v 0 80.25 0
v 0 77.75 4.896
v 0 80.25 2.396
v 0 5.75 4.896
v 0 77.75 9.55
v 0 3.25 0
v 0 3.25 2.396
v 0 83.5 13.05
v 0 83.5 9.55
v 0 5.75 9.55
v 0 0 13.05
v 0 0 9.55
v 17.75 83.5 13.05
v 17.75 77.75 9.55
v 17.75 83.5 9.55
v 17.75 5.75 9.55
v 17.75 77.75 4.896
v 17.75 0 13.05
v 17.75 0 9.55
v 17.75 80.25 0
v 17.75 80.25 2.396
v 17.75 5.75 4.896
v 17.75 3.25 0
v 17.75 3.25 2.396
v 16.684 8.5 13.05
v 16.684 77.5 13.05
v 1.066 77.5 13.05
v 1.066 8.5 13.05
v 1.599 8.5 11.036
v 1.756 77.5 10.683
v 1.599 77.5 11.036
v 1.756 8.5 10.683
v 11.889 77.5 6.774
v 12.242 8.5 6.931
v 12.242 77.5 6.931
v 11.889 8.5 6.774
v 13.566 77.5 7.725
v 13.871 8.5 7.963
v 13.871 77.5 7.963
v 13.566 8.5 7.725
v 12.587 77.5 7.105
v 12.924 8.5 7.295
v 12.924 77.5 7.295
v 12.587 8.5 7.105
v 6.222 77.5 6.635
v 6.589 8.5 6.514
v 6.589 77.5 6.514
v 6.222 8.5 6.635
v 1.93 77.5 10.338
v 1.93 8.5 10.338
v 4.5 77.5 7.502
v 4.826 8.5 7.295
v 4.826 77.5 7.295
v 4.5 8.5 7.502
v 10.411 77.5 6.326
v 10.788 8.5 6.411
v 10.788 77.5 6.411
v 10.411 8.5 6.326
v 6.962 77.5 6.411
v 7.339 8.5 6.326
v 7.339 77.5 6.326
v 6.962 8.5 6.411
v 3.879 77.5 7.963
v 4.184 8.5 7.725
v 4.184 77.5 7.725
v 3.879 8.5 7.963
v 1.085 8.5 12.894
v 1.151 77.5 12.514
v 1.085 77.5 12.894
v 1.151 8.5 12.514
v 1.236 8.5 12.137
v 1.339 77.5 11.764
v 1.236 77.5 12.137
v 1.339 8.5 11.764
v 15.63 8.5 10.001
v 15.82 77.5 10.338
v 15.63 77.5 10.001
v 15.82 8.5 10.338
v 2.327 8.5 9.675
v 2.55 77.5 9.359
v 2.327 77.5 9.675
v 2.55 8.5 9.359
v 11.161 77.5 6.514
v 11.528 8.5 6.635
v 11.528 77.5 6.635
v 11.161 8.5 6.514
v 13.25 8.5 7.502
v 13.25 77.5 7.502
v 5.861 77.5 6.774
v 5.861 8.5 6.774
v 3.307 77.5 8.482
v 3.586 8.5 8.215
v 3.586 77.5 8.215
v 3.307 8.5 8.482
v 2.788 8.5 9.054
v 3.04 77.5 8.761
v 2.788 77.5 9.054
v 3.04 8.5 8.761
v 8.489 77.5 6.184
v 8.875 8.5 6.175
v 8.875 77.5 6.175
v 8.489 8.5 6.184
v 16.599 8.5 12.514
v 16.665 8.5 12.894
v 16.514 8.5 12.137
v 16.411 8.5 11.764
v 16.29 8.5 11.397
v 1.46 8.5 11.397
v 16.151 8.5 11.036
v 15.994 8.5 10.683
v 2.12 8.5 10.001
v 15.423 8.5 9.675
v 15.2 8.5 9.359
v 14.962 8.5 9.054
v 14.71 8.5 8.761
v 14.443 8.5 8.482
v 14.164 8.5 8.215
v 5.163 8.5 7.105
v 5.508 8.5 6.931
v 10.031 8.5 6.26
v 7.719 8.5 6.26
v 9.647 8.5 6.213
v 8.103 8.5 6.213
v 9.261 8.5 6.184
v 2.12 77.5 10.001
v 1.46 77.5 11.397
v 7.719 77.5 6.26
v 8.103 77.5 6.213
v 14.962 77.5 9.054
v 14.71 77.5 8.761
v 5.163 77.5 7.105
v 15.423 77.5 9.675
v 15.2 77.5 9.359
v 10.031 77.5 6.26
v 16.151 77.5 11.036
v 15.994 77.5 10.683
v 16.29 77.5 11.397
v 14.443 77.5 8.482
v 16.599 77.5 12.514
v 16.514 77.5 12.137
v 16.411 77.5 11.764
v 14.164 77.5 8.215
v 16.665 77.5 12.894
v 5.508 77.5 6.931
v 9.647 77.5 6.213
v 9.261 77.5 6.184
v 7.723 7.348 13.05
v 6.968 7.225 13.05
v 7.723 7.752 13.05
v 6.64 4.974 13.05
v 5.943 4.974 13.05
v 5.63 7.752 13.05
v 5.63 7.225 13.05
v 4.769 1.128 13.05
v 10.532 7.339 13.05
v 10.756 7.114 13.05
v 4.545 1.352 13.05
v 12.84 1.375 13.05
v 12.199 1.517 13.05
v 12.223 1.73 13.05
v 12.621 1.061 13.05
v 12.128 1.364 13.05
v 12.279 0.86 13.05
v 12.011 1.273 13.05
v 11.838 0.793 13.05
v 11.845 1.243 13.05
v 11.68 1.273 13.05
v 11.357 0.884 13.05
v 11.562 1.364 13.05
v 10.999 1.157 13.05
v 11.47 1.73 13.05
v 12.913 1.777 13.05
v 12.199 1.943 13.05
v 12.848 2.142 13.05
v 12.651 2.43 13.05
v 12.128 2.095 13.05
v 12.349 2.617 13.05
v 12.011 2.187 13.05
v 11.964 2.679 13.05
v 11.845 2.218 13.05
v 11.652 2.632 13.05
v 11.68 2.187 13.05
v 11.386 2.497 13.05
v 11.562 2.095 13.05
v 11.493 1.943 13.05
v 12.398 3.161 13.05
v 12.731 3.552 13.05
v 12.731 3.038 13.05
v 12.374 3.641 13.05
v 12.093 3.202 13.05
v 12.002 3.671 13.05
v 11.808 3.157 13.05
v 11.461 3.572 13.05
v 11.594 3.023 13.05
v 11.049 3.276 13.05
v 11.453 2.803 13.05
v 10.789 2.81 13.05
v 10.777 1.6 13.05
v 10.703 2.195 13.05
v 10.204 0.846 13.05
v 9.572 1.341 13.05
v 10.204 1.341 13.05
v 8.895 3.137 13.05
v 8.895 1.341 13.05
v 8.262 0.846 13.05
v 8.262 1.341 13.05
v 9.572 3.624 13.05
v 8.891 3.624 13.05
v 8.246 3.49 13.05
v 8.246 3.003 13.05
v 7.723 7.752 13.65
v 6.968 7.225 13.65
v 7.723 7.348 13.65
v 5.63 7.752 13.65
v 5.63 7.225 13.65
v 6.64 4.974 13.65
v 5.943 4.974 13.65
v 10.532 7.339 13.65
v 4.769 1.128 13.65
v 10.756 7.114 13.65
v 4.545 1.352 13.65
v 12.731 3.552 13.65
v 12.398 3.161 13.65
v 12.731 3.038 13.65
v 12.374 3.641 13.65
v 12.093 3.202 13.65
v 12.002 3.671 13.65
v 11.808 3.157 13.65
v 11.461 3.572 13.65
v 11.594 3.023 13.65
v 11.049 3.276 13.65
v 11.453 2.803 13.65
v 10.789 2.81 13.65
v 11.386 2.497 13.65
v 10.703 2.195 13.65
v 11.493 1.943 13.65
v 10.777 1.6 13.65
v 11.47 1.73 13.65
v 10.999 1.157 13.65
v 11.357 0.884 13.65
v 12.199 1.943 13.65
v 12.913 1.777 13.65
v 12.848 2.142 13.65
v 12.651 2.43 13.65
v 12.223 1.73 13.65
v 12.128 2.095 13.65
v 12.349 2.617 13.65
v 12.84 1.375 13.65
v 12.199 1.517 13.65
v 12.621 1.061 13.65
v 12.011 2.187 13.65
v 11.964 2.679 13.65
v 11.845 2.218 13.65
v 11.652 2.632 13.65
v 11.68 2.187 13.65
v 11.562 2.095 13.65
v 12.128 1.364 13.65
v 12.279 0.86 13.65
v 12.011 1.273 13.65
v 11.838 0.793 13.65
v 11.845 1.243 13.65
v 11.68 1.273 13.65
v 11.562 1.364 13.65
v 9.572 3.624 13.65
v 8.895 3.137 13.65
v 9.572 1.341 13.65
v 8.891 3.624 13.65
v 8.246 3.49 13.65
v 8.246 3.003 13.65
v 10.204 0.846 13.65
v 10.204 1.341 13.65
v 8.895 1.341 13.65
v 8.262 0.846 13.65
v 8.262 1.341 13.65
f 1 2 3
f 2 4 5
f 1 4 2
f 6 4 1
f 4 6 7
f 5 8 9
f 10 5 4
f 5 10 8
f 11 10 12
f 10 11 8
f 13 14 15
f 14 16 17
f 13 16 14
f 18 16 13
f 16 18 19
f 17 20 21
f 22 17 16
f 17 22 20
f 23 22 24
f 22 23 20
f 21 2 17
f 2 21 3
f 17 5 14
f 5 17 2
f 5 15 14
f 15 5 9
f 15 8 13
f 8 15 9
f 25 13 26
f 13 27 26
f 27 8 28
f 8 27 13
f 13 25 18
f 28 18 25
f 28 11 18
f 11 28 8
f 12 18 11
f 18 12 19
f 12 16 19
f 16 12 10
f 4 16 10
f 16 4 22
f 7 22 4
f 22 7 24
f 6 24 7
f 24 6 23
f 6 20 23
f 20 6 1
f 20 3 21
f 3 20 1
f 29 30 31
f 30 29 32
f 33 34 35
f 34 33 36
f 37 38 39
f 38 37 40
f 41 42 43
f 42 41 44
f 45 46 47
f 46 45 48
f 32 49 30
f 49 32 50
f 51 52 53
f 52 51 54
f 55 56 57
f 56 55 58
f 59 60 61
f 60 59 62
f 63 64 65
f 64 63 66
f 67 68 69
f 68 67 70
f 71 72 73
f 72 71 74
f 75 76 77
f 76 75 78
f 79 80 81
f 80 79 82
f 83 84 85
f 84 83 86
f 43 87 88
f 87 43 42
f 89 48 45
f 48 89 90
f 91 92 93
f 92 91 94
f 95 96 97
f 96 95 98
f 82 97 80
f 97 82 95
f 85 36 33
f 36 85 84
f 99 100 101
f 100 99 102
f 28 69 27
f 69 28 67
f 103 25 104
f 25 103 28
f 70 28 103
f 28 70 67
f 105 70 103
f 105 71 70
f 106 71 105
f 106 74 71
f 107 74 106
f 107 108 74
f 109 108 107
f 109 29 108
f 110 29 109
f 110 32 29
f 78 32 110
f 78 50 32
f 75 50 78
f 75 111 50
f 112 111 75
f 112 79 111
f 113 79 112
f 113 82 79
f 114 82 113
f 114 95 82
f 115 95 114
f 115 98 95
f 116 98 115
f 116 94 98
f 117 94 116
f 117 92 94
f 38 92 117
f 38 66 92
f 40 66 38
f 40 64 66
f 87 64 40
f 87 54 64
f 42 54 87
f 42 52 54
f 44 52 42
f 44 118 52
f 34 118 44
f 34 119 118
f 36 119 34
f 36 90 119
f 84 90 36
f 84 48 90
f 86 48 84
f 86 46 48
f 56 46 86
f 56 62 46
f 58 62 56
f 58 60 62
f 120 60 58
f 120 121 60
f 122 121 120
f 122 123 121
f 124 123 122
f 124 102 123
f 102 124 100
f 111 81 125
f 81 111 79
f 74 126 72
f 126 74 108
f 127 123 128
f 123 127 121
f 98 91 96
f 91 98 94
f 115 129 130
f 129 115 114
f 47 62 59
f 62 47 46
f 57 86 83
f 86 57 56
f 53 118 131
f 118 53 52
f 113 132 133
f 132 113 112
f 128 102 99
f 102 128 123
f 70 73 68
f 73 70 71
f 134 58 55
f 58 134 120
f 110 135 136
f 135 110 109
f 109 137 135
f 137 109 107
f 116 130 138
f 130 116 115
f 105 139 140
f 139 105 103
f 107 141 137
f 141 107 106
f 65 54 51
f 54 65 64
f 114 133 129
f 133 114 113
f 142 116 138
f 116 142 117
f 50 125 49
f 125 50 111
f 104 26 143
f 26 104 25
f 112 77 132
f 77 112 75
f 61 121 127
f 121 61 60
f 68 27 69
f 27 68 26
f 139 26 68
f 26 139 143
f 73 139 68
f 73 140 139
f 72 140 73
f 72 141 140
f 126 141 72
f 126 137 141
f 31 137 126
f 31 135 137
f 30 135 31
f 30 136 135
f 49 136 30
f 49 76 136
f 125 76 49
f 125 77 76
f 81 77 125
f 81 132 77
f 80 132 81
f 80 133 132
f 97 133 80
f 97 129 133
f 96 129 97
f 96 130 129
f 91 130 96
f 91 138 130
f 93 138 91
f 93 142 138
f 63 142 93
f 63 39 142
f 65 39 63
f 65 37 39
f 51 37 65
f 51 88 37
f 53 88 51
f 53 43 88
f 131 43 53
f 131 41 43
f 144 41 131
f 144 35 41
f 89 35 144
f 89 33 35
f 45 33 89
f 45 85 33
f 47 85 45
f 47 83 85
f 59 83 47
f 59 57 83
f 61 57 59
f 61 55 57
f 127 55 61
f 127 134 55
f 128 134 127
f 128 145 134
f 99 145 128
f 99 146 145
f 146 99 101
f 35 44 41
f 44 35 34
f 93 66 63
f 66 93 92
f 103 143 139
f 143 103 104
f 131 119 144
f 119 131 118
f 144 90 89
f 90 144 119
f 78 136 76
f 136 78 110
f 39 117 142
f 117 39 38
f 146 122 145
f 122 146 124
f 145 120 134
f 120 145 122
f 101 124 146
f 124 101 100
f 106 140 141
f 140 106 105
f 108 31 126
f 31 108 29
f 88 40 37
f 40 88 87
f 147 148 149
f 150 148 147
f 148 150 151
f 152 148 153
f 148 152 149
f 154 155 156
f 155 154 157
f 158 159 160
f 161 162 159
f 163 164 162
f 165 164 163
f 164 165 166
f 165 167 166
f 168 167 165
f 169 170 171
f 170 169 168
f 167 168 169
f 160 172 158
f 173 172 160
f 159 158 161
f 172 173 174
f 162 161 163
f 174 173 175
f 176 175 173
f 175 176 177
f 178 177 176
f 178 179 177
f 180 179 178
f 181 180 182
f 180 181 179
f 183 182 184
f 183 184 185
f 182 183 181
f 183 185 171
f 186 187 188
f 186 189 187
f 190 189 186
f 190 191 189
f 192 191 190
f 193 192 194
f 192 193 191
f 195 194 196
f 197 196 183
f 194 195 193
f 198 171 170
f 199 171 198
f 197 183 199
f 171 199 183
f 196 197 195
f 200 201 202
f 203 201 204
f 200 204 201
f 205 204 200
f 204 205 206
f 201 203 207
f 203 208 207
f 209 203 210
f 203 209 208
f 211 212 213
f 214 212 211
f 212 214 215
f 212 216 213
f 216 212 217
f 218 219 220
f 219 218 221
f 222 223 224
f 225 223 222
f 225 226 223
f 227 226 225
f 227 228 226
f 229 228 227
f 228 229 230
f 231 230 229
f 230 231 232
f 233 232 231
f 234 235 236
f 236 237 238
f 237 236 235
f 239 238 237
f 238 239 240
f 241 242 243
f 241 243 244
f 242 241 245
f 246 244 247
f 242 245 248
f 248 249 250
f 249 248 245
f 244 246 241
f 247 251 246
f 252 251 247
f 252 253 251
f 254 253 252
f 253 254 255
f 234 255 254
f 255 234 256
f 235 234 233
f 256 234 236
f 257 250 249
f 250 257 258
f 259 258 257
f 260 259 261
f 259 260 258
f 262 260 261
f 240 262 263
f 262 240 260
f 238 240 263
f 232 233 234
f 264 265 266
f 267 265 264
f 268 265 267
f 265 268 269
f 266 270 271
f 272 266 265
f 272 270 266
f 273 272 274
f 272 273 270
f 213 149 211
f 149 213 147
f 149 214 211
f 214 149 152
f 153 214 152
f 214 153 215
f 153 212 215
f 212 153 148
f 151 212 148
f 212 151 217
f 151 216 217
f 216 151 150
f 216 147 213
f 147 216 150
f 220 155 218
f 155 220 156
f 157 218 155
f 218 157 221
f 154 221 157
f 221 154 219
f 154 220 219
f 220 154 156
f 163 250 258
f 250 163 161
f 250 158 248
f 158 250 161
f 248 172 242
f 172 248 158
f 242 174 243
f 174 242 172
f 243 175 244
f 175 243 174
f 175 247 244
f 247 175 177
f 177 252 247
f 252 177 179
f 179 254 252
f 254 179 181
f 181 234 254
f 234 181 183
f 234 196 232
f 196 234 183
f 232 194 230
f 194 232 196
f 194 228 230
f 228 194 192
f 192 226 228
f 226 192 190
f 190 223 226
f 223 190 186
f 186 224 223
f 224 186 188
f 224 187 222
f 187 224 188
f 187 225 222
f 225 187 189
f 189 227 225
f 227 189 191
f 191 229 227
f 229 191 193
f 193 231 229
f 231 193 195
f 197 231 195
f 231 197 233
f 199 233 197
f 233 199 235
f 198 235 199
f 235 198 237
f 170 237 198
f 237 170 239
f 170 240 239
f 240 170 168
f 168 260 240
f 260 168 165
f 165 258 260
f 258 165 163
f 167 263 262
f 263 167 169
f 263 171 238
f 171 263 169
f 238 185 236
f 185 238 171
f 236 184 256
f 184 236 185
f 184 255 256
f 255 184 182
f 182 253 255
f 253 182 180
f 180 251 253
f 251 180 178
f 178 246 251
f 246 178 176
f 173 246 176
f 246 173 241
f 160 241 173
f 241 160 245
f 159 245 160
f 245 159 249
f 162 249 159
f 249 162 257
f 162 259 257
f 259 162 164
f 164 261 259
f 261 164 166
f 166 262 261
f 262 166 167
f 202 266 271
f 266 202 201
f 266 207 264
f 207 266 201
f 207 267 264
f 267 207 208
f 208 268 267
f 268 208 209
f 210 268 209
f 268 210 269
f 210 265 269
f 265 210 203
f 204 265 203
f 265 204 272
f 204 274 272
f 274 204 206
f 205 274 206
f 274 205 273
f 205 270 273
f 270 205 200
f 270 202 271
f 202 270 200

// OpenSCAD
socketDiameter = 15; // expected parameter, outer diameter of socket
holeDiameter = socketDiameter + .75; // accounting for smooth clearance
sliderWidth = holeDiameter + 2 ;  // total thickness

assert(socketDiameter > 0, "socketDiameter must be greater than 0");
assert(socketDiameter <= 27.3, "socketDiameter must be less than or equal to 27.3");

socketLength = 66; // expected parameter, length of socket when laid on side
holeLength = min(socketLength + 3, 70.5);

assert(socketLength < 67, "socketLength must be less than 67");
assert(socketLength > 0, "socketLength must be greater than 0");

// label parameters, user EITHER labelNumerator/Denominator OR labelMetric
labelPosition = "bottom";
labelNumerator = 7; // expected parameter (required for imperial)
labelDenominator = 16; // expected parameter (required for imperial)
labelMetric = undef; // expected parameter (required for metric)

assert(labelPosition == "top" || labelPosition == "bottom", "labelPosition must be \"top\" or \"bottom\"");

function isLabelMetric() = 
    !is_undef(labelMetric);
 
function isLabelImperial() =
    !is_undef(labelNumerator) &&
    !is_undef(labelDenominator);

assert(
    isLabelMetric() || isLabelImperial(), "Missing parameters: EITHER labelMetric OR labelNumerator and labelDenominator must be provided");
assert(
    !(isLabelMetric() && isLabelImperial()), "Extra parameters: label parameters for both metric and imperial labels has been provided. EITHER labelMetric OR labelNumerator and labelDenominator must be provided");
    
labelFile = isLabelMetric() ? str(labelMetric, "mm_bold.dxf") : str(labelNumerator, "_over_", labelDenominator, "_bold.dxf"); 

// shape controls
H = 13.05;
topL = 83.5;
bottomL = 77;
topLipH  = 3.5;
botLipH = 2.396;
diagHeight  = 4.896;
neckHalf = 36;
diagRun  = 2.5;

$fn = 128;

// Hole position in the cross-section (YZ plane)
hole_y = H + 1;
hole_z = sliderWidth/2;     

hole_len = topL;

module silhouette_2d() {
  cx = topL/2;
  bottomTrim = (topL - bottomL)/2;
  polygon(points=[
    [0, H],
    [topL, H],

    [topL, H - topLipH],
    [cx + neckHalf, H - topLipH],

    [cx + neckHalf, diagHeight],

    [cx + neckHalf + diagRun, botLipH],
    [ topL - bottomTrim, 0],
    [0, 0],

    [bottomTrim, 0],
    [bottomTrim, botLipH],
    [cx - neckHalf, diagHeight],

    [cx - neckHalf, H - topLipH],
    [0, H - topLipH]
  ]);
}

module body() {
  linear_extrude(height=sliderWidth)
    silhouette_2d();
}

module hole_through_length() {
  x0 = labelPosition == "top" ? 6.5 : 8.5 ;

  translate([x0, hole_y, hole_z])
    rotate([0, 90, 0])
      cylinder(h=holeLength, d=holeDiameter, center=false);
}

module model() {
  // cut hole through model
  difference() {
    body();
    hole_through_length();
  }
}

// Make Y become Z (so "height" is up)
rotate([90, 0, 90])
    model();

labelPath = str("./labels/", labelFile);
labelXOffset = isLabelMetric() ? len(str(labelMetric)) * 2.5 : len(str(labelNumerator)) + len(str(labelDenominator)) + .5;
labelYOffset = isLabelMetric() ? 17 : 17;

scaleFactor = isLabelMetric() ? .8 : .4;

translate([sliderWidth/2 - labelXOffset, labelPosition == "top" ? topL - labelYOffset/2 : 0, H])
    linear_extrude(height=.6)
        scale(scaleFactor)
            import(labelPath);
